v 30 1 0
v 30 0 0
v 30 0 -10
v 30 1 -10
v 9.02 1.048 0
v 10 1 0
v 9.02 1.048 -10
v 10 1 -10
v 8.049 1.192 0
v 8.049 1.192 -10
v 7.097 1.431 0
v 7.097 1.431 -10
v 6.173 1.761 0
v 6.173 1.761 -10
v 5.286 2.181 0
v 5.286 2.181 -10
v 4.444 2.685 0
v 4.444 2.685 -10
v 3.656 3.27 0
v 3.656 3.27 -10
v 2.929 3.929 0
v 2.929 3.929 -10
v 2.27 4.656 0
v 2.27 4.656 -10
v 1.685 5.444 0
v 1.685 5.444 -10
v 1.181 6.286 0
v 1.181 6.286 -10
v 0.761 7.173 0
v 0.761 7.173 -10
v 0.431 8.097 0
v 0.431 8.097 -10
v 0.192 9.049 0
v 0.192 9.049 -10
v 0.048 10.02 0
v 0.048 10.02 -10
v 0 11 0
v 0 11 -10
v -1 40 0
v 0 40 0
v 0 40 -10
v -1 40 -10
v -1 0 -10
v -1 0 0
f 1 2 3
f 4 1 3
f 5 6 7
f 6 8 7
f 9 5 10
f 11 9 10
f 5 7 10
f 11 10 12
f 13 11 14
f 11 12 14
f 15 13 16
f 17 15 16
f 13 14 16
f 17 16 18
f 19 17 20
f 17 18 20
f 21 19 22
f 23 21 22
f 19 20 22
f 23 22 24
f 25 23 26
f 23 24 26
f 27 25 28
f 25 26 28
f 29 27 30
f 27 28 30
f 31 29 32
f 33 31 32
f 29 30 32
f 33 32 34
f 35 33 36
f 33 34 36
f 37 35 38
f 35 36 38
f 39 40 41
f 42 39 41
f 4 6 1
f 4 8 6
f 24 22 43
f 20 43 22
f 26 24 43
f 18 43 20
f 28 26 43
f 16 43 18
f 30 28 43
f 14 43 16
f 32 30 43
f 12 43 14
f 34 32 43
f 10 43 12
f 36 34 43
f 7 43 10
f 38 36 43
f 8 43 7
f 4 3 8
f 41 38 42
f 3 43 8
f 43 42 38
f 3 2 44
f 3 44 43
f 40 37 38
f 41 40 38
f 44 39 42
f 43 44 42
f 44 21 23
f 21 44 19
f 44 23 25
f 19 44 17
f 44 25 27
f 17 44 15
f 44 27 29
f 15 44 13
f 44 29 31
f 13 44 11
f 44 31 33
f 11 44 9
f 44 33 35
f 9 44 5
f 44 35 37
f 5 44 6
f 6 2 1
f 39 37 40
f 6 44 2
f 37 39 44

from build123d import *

# Parameters (mm, degrees)
SKETCH1_W           = 30
SKETCH1_H           = 10
BOSS_EXTRUDE1_DEPTH = 1
SKETCH4_W           = 10
SKETCH4_H           = 40
BOSS_EXTRUDE2_DEPTH = 1
FILLET2_R           = 10


with BuildPart() as part:
    # Sketch1 → Boss-Extrude1 (new body)
    with BuildSketch(Plane(origin=(0, 0, 0), x_dir=(1, 0, 0), z_dir=(0, 1, 0))):
        with Locations((15, 5)):
            Rectangle(SKETCH1_W, SKETCH1_H)
    extrude(amount=BOSS_EXTRUDE1_DEPTH)

    # Sketch4 → Boss-Extrude2 (add)
    with BuildSketch(Plane(origin=(0, 0, 0), x_dir=(0, 0, -1), z_dir=(1, 0, 0))):
        with Locations((5, 20)):
            Rectangle(SKETCH4_W, SKETCH4_H)
    extrude(amount=-BOSS_EXTRUDE2_DEPTH)

    # Fillet2
    fillet2_edges = [part.edges().sort_by_distance(p)[0] for p in [
        (0, 1, -5),
    ]]
    fillet(fillet2_edges, radius=FILLET2_R)


solid = part.part
